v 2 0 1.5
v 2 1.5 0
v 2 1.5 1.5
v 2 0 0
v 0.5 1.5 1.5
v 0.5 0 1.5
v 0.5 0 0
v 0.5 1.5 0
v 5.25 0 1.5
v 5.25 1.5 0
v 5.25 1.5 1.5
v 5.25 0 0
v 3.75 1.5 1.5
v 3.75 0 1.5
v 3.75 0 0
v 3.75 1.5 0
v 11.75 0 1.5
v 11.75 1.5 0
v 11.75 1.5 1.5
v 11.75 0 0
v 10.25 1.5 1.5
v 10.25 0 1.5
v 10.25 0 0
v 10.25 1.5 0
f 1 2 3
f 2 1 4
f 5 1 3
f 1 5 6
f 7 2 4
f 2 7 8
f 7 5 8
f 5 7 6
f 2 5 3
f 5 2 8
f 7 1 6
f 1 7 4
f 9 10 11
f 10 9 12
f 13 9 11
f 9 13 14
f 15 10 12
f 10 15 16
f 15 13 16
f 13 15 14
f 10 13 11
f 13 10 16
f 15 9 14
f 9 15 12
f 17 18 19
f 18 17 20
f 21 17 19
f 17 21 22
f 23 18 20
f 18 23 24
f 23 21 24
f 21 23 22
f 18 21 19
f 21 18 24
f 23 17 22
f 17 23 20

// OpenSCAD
union() {
  translate([0.5, 0.0, 0.0]) cube(size=[1.5,1.5,1.5], center=false);
  translate([3.75, 0.0, 0.0]) cube(size=[1.5,1.5,1.5], center=false);
  translate([10.25, 0.0, 0.0]) cube(size=[1.5,1.5,1.5], center=false);
}
